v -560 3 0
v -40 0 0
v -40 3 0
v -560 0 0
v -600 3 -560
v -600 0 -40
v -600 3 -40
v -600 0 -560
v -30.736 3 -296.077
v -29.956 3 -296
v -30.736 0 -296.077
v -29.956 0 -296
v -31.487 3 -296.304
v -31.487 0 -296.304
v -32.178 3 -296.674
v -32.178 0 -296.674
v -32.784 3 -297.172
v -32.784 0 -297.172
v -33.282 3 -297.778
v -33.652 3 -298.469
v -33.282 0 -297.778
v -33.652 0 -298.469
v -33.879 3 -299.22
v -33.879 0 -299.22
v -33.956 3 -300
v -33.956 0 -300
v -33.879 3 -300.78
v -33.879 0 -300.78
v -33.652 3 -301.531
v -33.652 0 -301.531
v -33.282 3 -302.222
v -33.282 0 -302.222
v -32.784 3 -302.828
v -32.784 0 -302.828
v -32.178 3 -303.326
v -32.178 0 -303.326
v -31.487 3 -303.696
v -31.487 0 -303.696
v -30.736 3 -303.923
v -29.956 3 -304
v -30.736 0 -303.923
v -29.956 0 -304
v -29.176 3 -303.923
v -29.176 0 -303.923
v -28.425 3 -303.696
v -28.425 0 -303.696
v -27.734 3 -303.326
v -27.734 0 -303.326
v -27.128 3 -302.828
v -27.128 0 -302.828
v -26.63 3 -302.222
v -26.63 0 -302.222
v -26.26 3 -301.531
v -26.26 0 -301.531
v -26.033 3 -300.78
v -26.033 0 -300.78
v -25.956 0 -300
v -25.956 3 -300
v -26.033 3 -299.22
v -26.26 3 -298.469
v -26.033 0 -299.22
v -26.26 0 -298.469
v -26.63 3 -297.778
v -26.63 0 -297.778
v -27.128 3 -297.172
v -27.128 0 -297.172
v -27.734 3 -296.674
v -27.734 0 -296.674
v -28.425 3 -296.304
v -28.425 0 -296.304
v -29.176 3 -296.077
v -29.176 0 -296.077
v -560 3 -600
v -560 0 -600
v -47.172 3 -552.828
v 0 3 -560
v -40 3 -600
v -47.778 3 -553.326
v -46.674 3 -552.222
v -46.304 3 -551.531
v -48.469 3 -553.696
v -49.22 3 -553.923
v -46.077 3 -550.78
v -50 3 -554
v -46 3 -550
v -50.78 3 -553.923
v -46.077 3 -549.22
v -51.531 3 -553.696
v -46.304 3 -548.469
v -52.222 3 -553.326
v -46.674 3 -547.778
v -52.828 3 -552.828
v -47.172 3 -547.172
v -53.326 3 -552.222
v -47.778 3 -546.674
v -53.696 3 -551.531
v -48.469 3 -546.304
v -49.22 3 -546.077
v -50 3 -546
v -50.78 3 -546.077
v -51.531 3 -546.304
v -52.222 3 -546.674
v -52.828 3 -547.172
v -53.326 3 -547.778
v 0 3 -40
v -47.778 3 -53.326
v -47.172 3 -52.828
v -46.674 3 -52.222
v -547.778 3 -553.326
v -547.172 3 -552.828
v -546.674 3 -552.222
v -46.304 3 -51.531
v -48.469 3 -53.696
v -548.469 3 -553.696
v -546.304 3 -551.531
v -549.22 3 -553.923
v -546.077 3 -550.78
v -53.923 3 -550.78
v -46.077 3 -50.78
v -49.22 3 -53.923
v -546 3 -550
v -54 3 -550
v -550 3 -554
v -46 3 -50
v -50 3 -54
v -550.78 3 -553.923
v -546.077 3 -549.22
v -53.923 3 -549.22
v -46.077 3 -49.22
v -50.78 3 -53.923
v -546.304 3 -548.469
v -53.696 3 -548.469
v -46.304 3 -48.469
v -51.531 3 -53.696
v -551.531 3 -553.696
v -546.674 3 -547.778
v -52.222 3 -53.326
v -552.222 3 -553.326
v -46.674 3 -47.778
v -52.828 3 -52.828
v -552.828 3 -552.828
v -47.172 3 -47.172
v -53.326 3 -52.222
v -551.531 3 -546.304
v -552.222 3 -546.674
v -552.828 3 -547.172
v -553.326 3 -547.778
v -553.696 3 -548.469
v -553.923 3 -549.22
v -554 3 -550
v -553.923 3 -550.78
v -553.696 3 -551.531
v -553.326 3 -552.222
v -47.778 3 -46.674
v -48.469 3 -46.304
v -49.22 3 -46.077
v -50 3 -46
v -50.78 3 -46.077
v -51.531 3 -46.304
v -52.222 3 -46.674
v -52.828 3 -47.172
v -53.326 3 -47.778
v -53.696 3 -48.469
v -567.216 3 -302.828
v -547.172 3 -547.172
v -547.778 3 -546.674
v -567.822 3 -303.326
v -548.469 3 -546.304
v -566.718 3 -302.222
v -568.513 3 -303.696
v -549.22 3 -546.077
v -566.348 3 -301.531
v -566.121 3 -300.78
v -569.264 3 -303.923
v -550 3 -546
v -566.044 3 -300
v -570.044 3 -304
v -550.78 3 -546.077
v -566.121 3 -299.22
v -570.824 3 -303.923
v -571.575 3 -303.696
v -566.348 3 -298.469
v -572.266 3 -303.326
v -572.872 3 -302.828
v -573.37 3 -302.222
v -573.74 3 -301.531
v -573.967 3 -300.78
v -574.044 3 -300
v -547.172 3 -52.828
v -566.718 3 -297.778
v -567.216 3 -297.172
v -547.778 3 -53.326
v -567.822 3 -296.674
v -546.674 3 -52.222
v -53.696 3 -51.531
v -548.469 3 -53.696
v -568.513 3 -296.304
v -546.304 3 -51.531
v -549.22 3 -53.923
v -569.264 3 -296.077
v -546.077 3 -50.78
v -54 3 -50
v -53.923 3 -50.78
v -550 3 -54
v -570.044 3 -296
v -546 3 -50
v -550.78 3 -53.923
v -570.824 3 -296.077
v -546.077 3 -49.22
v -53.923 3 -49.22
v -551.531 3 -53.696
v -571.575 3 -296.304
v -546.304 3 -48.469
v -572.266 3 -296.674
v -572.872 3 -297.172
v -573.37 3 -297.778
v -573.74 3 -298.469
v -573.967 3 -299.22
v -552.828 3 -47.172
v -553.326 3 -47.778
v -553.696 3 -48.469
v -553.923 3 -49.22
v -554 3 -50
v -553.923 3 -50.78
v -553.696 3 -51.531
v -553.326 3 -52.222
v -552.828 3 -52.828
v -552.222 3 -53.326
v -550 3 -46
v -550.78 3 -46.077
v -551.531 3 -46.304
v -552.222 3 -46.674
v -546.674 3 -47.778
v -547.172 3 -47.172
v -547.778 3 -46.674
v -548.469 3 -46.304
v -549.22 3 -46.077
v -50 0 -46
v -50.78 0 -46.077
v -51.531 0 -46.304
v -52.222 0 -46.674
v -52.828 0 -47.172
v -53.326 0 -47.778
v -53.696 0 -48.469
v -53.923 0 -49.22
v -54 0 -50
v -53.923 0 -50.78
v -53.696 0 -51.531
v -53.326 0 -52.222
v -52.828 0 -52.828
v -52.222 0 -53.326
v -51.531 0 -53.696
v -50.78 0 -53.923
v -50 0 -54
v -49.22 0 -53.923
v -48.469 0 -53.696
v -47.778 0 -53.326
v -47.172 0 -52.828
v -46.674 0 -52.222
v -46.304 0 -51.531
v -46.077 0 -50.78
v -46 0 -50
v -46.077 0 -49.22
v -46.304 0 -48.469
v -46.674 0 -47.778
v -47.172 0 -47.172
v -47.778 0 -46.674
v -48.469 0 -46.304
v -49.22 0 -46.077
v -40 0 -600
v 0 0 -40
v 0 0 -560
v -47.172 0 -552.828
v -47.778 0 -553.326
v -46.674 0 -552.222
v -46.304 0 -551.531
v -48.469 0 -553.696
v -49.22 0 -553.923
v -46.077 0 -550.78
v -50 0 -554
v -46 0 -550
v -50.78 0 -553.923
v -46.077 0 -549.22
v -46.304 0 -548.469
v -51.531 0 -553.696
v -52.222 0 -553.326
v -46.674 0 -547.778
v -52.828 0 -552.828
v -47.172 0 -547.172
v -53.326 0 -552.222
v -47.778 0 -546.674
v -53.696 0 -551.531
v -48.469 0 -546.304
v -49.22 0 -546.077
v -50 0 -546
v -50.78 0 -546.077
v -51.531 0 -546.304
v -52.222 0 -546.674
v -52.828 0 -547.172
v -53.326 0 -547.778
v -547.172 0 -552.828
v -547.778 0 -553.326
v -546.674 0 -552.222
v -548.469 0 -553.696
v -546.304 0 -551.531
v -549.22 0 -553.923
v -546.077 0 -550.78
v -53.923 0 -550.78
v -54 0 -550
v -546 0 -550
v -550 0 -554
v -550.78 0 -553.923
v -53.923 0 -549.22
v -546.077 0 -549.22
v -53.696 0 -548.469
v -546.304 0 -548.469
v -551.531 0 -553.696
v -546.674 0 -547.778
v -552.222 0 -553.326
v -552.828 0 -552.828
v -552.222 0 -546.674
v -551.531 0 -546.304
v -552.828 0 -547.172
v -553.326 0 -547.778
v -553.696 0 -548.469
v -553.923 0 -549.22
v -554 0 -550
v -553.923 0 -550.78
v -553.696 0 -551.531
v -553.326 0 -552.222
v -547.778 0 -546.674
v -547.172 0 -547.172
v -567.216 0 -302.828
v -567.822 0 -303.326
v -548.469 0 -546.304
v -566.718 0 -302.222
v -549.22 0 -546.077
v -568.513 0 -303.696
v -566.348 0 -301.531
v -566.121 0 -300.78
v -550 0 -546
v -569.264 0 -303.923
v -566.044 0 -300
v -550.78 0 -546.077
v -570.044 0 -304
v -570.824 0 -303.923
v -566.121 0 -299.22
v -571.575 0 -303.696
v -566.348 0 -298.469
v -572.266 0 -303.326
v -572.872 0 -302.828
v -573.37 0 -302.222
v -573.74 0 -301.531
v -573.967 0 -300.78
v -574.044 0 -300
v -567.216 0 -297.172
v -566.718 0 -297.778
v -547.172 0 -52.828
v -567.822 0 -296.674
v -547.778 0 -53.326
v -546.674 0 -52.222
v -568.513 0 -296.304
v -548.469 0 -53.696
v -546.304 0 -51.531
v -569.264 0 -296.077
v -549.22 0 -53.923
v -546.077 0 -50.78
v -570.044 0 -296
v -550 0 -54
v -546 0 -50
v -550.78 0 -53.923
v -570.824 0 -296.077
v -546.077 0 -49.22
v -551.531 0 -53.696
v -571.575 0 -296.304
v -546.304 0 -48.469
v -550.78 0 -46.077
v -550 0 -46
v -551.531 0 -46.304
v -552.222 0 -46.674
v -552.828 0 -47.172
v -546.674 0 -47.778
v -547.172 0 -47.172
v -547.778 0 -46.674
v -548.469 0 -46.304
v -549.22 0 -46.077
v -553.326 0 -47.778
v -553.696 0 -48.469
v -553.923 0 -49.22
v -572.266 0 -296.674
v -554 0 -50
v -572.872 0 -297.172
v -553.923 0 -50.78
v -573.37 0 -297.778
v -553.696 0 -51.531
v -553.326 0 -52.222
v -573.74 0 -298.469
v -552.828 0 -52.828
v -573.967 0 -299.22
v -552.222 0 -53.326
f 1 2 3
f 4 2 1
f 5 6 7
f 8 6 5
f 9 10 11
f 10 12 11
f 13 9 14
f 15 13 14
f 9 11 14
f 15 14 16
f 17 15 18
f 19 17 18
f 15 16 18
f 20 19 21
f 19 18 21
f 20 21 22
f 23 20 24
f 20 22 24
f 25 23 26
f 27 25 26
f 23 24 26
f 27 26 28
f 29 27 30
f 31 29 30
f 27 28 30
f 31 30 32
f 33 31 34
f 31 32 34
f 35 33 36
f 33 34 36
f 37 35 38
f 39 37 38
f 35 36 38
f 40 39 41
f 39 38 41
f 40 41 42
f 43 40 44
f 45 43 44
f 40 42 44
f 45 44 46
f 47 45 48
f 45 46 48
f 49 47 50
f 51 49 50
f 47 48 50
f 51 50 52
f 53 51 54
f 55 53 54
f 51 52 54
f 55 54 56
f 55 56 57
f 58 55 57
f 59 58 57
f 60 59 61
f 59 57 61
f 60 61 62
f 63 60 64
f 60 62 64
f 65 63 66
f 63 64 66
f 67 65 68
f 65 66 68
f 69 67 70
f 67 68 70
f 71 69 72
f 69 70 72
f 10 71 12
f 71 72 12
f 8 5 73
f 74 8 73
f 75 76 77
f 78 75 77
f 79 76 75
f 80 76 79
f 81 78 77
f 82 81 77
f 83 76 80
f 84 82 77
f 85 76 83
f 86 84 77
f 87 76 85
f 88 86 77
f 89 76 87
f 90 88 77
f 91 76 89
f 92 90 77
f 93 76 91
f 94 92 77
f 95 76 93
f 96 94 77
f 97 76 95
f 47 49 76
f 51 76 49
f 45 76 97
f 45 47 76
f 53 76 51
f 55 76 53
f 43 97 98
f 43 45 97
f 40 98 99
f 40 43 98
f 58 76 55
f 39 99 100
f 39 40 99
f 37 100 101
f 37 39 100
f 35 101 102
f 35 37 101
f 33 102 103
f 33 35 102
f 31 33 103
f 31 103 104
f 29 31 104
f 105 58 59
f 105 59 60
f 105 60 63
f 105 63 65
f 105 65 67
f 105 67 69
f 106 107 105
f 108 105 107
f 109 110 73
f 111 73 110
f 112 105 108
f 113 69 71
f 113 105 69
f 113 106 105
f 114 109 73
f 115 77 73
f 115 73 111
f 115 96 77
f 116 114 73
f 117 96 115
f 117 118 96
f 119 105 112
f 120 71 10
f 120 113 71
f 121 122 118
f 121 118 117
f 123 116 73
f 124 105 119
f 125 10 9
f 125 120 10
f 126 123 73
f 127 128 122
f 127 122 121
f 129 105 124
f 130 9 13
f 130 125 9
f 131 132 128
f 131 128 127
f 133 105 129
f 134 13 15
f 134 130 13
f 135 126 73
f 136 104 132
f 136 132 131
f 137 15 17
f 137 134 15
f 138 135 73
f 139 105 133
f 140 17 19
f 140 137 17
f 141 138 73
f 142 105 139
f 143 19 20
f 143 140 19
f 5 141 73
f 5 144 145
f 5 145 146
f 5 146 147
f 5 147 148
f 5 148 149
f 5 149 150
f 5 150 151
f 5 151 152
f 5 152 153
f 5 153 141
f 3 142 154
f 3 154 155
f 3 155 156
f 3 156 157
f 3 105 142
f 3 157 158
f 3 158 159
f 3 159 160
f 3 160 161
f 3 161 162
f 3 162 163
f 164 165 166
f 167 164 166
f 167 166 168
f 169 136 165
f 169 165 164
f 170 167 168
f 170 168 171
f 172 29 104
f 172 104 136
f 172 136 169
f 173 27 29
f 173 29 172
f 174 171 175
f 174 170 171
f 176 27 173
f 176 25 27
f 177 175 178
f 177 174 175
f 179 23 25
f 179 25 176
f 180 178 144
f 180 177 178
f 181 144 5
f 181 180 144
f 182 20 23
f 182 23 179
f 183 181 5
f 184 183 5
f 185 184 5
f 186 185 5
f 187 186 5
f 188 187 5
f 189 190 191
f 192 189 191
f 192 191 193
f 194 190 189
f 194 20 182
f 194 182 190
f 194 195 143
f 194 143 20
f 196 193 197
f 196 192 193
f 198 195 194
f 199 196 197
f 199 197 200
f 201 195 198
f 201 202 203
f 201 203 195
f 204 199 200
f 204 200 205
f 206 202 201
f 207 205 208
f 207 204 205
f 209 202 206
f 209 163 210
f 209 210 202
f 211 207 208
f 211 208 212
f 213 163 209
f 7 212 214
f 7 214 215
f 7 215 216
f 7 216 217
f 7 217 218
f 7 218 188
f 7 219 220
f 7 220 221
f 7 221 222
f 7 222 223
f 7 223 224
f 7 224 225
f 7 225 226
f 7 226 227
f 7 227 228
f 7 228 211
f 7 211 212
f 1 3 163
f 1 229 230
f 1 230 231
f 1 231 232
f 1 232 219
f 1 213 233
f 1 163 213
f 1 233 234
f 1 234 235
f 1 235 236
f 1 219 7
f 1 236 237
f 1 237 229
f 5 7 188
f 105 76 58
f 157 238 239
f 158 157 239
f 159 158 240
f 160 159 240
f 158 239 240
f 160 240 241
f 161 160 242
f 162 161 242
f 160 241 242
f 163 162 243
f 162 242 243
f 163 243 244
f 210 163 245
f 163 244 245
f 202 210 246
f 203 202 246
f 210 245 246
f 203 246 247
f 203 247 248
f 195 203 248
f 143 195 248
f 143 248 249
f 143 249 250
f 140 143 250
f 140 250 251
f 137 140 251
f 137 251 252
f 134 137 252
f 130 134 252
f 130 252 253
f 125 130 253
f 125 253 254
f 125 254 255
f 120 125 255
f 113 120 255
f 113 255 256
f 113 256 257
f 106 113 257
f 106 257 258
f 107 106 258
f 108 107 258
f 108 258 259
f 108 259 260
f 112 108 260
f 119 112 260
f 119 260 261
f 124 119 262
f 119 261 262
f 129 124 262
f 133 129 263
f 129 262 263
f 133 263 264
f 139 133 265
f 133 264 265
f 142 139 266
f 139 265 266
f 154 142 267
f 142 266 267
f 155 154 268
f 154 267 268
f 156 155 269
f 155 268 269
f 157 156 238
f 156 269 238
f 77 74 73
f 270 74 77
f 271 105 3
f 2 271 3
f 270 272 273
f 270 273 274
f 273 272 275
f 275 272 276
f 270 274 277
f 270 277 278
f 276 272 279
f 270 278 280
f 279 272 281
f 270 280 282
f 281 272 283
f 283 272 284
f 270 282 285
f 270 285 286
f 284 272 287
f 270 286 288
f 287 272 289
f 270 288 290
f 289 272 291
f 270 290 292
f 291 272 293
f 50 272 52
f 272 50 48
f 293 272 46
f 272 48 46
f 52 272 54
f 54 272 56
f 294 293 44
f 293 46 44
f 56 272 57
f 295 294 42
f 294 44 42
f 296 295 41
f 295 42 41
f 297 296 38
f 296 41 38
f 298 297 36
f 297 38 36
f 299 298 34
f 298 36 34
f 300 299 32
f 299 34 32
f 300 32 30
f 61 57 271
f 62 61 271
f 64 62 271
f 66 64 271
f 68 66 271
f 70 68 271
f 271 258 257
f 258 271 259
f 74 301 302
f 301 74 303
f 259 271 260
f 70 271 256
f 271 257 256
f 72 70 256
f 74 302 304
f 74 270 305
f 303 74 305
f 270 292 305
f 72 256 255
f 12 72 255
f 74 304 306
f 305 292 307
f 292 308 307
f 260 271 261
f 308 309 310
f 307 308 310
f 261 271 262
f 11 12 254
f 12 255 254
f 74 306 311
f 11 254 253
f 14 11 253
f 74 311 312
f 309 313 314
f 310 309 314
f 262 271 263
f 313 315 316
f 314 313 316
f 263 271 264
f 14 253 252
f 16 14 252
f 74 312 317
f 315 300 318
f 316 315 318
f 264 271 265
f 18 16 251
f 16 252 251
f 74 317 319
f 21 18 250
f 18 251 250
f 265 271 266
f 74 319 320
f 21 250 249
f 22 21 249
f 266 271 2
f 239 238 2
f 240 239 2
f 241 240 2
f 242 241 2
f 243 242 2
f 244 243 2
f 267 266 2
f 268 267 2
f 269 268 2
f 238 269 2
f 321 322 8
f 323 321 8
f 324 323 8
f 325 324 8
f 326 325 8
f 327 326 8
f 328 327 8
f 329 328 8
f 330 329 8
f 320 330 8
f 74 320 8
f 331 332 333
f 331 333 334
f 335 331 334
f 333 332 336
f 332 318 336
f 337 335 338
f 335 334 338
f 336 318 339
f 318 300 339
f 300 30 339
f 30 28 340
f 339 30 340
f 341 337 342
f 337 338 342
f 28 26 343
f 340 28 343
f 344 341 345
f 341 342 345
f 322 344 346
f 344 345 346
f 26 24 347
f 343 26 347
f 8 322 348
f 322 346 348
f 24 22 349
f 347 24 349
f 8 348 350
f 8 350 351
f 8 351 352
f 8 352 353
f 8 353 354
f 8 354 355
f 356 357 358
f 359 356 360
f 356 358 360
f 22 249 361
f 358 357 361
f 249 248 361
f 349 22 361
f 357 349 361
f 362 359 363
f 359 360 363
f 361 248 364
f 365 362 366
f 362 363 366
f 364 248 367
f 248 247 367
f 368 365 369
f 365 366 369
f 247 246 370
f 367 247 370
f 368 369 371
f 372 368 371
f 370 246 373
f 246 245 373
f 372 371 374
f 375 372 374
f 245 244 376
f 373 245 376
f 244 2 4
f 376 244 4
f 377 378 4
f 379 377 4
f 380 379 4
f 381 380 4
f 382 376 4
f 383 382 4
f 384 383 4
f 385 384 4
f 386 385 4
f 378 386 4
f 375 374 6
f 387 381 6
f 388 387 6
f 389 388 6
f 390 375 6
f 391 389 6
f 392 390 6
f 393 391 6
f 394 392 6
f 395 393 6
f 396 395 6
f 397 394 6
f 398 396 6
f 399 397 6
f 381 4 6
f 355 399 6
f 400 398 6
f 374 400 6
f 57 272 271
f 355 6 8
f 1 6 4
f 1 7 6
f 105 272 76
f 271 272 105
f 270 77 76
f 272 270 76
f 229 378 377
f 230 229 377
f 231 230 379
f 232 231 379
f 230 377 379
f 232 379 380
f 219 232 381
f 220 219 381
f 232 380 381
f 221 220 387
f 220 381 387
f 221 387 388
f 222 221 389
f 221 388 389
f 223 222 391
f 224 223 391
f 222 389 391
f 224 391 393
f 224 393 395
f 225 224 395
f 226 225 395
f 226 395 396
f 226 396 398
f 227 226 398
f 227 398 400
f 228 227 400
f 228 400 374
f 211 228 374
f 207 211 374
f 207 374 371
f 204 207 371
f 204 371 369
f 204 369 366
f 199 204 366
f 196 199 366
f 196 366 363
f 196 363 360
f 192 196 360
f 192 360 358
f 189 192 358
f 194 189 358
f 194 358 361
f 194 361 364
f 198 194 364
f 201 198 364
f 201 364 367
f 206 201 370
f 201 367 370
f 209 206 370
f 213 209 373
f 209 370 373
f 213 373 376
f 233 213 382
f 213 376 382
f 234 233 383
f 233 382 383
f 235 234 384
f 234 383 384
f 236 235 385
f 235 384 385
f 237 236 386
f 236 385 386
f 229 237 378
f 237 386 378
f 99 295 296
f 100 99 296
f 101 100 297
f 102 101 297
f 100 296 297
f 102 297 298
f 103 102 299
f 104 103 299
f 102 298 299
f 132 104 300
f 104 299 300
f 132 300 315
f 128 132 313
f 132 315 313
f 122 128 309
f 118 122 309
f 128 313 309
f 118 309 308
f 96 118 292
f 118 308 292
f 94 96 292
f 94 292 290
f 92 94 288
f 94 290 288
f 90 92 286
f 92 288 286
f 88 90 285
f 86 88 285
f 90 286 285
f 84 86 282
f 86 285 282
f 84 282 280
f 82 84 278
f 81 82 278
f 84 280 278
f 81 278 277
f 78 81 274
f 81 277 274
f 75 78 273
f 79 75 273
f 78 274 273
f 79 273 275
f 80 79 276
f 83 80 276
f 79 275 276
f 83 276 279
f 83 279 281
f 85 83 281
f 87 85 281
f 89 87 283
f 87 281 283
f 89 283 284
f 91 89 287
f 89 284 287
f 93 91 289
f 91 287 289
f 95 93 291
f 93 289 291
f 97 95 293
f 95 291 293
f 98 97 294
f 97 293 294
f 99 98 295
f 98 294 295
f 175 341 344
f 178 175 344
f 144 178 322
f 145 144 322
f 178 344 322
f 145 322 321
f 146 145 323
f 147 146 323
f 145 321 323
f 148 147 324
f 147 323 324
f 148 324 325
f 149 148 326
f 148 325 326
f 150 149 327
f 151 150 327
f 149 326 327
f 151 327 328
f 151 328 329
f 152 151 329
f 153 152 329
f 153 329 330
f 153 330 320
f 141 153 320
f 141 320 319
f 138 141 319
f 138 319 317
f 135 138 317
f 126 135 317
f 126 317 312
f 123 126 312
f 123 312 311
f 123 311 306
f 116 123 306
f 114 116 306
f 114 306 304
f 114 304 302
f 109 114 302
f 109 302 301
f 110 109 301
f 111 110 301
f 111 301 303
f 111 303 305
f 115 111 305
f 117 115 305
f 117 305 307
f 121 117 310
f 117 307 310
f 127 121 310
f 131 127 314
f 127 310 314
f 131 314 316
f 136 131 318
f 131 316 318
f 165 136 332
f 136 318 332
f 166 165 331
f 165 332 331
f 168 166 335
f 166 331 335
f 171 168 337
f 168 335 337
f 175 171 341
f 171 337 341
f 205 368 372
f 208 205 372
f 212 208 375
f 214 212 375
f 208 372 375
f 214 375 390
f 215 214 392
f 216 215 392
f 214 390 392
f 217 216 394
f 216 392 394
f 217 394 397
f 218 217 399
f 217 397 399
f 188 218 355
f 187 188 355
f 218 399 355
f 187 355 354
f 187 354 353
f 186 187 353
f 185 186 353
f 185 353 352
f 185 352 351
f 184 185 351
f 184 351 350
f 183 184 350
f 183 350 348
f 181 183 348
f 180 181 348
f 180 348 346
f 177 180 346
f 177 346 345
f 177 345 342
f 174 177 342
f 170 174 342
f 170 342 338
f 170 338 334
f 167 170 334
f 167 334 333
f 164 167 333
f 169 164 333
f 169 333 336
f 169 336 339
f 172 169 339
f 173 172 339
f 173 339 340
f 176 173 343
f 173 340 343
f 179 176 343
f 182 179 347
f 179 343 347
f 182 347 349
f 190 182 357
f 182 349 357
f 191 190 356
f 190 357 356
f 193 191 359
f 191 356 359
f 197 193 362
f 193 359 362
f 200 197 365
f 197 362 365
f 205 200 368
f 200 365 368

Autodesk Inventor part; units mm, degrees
ref_plane "YZ Plane" through (0, 0, 0) normal (1, 0, 0) x (0, 1, 0)
ref_plane "XZ Plane" through (0, 0, 0) normal (0, 1, 0) x (-1, 0, 0)
ref_plane "XY Plane" through (0, 0, 0) normal (0, 0, 1) x (1, 0, 0)
sketch "Esboço1" plane through (0, 0, 0) normal (0, 1, 0) x (-1, 0, 0)
  line L0 (0, 0) -> (600, 0)
  line L1 (600, 0) -> (600, -600)
  line L2 (600, -600) -> (0, -600)
  line L3 (0, -600) -> (0, 0)
extrude "Extrusão1" add sketch "Esboço1" along normal blind 3
sketch "Esboço2" plane through (0, 3, 0) normal (0, 1, 0) x (1, 0, 0)
  point P0 (0, 0)
  point P1 (-50, 50)
  point P2 (-550, 50)
  point P3 (-50, 550)
  point P4 (-550, 550)
hole "Furo1" at (-50, 3, -50) at (-550, 3, -50) at (-50, 3, -550) at (-550, 3, -550) direction (0, -1, 0) diameter 8 end through all
sketch "Esboço3" plane through (0, 3, 0) normal (0, 1, 0) x (1, 0, 0)
  line L0 (0, 0) -> (0, 600) projected
  line L1 (-600, 600) -> (-600, 0) projected
  point P0 (-29.956, 300)
  point P1 (-570.044, 300)
  dimension "d18" = 29.956
  dimension "d19" = 29.956
hole "Furo2" at (-29.956, 3, -300) at (-570.044, 3, -300) direction (0, -1, 0) diameter 8 end through all
sketch "Esboço4" plane through (0, 3, 0) normal (0, 1, 0) x (1, 0, 0)
  line L0 (-600, 0) -> (0, 0) projected
  line L1 (0, 0) -> (0, 40)
  line L2 (0, 0) -> (0, 600) projected
  line L3 (0, 40) -> (-40, 0)
  line L4 (-40, 0) -> (0, 0)
  line L5 (0, 600) -> (-40, 600)
  line L6 (0, 600) -> (-600, 600) projected
  line L7 (-40, 600) -> (0, 560)
  line L8 (0, 600) -> (0, 560)
  line L9 (-600, 600) -> (-600, 0) projected
  line L10 (-600, 600) -> (-600, 560)
  line L11 (-600, 560) -> (-560, 600)
  line L12 (-560, 600) -> (-600, 600)
  line L13 (-600, 0) -> (-600, 40)
  line L14 (-600, 40) -> (-560, 0)
  line L15 (-560, 0) -> (-600, 0)
  dimension "d20" = 40
  dimension "d21" = 45
  dimension "d22" = 40
extrude "Extrusão2" cut sketch "Esboço4" against normal through all contours L9 L14 L0 | L3 L1 L0 | L9 L6 L11 | L7 L5 L2
properties part number "fundo falso" material "MDF - Chapa de fibra de média densidade"
